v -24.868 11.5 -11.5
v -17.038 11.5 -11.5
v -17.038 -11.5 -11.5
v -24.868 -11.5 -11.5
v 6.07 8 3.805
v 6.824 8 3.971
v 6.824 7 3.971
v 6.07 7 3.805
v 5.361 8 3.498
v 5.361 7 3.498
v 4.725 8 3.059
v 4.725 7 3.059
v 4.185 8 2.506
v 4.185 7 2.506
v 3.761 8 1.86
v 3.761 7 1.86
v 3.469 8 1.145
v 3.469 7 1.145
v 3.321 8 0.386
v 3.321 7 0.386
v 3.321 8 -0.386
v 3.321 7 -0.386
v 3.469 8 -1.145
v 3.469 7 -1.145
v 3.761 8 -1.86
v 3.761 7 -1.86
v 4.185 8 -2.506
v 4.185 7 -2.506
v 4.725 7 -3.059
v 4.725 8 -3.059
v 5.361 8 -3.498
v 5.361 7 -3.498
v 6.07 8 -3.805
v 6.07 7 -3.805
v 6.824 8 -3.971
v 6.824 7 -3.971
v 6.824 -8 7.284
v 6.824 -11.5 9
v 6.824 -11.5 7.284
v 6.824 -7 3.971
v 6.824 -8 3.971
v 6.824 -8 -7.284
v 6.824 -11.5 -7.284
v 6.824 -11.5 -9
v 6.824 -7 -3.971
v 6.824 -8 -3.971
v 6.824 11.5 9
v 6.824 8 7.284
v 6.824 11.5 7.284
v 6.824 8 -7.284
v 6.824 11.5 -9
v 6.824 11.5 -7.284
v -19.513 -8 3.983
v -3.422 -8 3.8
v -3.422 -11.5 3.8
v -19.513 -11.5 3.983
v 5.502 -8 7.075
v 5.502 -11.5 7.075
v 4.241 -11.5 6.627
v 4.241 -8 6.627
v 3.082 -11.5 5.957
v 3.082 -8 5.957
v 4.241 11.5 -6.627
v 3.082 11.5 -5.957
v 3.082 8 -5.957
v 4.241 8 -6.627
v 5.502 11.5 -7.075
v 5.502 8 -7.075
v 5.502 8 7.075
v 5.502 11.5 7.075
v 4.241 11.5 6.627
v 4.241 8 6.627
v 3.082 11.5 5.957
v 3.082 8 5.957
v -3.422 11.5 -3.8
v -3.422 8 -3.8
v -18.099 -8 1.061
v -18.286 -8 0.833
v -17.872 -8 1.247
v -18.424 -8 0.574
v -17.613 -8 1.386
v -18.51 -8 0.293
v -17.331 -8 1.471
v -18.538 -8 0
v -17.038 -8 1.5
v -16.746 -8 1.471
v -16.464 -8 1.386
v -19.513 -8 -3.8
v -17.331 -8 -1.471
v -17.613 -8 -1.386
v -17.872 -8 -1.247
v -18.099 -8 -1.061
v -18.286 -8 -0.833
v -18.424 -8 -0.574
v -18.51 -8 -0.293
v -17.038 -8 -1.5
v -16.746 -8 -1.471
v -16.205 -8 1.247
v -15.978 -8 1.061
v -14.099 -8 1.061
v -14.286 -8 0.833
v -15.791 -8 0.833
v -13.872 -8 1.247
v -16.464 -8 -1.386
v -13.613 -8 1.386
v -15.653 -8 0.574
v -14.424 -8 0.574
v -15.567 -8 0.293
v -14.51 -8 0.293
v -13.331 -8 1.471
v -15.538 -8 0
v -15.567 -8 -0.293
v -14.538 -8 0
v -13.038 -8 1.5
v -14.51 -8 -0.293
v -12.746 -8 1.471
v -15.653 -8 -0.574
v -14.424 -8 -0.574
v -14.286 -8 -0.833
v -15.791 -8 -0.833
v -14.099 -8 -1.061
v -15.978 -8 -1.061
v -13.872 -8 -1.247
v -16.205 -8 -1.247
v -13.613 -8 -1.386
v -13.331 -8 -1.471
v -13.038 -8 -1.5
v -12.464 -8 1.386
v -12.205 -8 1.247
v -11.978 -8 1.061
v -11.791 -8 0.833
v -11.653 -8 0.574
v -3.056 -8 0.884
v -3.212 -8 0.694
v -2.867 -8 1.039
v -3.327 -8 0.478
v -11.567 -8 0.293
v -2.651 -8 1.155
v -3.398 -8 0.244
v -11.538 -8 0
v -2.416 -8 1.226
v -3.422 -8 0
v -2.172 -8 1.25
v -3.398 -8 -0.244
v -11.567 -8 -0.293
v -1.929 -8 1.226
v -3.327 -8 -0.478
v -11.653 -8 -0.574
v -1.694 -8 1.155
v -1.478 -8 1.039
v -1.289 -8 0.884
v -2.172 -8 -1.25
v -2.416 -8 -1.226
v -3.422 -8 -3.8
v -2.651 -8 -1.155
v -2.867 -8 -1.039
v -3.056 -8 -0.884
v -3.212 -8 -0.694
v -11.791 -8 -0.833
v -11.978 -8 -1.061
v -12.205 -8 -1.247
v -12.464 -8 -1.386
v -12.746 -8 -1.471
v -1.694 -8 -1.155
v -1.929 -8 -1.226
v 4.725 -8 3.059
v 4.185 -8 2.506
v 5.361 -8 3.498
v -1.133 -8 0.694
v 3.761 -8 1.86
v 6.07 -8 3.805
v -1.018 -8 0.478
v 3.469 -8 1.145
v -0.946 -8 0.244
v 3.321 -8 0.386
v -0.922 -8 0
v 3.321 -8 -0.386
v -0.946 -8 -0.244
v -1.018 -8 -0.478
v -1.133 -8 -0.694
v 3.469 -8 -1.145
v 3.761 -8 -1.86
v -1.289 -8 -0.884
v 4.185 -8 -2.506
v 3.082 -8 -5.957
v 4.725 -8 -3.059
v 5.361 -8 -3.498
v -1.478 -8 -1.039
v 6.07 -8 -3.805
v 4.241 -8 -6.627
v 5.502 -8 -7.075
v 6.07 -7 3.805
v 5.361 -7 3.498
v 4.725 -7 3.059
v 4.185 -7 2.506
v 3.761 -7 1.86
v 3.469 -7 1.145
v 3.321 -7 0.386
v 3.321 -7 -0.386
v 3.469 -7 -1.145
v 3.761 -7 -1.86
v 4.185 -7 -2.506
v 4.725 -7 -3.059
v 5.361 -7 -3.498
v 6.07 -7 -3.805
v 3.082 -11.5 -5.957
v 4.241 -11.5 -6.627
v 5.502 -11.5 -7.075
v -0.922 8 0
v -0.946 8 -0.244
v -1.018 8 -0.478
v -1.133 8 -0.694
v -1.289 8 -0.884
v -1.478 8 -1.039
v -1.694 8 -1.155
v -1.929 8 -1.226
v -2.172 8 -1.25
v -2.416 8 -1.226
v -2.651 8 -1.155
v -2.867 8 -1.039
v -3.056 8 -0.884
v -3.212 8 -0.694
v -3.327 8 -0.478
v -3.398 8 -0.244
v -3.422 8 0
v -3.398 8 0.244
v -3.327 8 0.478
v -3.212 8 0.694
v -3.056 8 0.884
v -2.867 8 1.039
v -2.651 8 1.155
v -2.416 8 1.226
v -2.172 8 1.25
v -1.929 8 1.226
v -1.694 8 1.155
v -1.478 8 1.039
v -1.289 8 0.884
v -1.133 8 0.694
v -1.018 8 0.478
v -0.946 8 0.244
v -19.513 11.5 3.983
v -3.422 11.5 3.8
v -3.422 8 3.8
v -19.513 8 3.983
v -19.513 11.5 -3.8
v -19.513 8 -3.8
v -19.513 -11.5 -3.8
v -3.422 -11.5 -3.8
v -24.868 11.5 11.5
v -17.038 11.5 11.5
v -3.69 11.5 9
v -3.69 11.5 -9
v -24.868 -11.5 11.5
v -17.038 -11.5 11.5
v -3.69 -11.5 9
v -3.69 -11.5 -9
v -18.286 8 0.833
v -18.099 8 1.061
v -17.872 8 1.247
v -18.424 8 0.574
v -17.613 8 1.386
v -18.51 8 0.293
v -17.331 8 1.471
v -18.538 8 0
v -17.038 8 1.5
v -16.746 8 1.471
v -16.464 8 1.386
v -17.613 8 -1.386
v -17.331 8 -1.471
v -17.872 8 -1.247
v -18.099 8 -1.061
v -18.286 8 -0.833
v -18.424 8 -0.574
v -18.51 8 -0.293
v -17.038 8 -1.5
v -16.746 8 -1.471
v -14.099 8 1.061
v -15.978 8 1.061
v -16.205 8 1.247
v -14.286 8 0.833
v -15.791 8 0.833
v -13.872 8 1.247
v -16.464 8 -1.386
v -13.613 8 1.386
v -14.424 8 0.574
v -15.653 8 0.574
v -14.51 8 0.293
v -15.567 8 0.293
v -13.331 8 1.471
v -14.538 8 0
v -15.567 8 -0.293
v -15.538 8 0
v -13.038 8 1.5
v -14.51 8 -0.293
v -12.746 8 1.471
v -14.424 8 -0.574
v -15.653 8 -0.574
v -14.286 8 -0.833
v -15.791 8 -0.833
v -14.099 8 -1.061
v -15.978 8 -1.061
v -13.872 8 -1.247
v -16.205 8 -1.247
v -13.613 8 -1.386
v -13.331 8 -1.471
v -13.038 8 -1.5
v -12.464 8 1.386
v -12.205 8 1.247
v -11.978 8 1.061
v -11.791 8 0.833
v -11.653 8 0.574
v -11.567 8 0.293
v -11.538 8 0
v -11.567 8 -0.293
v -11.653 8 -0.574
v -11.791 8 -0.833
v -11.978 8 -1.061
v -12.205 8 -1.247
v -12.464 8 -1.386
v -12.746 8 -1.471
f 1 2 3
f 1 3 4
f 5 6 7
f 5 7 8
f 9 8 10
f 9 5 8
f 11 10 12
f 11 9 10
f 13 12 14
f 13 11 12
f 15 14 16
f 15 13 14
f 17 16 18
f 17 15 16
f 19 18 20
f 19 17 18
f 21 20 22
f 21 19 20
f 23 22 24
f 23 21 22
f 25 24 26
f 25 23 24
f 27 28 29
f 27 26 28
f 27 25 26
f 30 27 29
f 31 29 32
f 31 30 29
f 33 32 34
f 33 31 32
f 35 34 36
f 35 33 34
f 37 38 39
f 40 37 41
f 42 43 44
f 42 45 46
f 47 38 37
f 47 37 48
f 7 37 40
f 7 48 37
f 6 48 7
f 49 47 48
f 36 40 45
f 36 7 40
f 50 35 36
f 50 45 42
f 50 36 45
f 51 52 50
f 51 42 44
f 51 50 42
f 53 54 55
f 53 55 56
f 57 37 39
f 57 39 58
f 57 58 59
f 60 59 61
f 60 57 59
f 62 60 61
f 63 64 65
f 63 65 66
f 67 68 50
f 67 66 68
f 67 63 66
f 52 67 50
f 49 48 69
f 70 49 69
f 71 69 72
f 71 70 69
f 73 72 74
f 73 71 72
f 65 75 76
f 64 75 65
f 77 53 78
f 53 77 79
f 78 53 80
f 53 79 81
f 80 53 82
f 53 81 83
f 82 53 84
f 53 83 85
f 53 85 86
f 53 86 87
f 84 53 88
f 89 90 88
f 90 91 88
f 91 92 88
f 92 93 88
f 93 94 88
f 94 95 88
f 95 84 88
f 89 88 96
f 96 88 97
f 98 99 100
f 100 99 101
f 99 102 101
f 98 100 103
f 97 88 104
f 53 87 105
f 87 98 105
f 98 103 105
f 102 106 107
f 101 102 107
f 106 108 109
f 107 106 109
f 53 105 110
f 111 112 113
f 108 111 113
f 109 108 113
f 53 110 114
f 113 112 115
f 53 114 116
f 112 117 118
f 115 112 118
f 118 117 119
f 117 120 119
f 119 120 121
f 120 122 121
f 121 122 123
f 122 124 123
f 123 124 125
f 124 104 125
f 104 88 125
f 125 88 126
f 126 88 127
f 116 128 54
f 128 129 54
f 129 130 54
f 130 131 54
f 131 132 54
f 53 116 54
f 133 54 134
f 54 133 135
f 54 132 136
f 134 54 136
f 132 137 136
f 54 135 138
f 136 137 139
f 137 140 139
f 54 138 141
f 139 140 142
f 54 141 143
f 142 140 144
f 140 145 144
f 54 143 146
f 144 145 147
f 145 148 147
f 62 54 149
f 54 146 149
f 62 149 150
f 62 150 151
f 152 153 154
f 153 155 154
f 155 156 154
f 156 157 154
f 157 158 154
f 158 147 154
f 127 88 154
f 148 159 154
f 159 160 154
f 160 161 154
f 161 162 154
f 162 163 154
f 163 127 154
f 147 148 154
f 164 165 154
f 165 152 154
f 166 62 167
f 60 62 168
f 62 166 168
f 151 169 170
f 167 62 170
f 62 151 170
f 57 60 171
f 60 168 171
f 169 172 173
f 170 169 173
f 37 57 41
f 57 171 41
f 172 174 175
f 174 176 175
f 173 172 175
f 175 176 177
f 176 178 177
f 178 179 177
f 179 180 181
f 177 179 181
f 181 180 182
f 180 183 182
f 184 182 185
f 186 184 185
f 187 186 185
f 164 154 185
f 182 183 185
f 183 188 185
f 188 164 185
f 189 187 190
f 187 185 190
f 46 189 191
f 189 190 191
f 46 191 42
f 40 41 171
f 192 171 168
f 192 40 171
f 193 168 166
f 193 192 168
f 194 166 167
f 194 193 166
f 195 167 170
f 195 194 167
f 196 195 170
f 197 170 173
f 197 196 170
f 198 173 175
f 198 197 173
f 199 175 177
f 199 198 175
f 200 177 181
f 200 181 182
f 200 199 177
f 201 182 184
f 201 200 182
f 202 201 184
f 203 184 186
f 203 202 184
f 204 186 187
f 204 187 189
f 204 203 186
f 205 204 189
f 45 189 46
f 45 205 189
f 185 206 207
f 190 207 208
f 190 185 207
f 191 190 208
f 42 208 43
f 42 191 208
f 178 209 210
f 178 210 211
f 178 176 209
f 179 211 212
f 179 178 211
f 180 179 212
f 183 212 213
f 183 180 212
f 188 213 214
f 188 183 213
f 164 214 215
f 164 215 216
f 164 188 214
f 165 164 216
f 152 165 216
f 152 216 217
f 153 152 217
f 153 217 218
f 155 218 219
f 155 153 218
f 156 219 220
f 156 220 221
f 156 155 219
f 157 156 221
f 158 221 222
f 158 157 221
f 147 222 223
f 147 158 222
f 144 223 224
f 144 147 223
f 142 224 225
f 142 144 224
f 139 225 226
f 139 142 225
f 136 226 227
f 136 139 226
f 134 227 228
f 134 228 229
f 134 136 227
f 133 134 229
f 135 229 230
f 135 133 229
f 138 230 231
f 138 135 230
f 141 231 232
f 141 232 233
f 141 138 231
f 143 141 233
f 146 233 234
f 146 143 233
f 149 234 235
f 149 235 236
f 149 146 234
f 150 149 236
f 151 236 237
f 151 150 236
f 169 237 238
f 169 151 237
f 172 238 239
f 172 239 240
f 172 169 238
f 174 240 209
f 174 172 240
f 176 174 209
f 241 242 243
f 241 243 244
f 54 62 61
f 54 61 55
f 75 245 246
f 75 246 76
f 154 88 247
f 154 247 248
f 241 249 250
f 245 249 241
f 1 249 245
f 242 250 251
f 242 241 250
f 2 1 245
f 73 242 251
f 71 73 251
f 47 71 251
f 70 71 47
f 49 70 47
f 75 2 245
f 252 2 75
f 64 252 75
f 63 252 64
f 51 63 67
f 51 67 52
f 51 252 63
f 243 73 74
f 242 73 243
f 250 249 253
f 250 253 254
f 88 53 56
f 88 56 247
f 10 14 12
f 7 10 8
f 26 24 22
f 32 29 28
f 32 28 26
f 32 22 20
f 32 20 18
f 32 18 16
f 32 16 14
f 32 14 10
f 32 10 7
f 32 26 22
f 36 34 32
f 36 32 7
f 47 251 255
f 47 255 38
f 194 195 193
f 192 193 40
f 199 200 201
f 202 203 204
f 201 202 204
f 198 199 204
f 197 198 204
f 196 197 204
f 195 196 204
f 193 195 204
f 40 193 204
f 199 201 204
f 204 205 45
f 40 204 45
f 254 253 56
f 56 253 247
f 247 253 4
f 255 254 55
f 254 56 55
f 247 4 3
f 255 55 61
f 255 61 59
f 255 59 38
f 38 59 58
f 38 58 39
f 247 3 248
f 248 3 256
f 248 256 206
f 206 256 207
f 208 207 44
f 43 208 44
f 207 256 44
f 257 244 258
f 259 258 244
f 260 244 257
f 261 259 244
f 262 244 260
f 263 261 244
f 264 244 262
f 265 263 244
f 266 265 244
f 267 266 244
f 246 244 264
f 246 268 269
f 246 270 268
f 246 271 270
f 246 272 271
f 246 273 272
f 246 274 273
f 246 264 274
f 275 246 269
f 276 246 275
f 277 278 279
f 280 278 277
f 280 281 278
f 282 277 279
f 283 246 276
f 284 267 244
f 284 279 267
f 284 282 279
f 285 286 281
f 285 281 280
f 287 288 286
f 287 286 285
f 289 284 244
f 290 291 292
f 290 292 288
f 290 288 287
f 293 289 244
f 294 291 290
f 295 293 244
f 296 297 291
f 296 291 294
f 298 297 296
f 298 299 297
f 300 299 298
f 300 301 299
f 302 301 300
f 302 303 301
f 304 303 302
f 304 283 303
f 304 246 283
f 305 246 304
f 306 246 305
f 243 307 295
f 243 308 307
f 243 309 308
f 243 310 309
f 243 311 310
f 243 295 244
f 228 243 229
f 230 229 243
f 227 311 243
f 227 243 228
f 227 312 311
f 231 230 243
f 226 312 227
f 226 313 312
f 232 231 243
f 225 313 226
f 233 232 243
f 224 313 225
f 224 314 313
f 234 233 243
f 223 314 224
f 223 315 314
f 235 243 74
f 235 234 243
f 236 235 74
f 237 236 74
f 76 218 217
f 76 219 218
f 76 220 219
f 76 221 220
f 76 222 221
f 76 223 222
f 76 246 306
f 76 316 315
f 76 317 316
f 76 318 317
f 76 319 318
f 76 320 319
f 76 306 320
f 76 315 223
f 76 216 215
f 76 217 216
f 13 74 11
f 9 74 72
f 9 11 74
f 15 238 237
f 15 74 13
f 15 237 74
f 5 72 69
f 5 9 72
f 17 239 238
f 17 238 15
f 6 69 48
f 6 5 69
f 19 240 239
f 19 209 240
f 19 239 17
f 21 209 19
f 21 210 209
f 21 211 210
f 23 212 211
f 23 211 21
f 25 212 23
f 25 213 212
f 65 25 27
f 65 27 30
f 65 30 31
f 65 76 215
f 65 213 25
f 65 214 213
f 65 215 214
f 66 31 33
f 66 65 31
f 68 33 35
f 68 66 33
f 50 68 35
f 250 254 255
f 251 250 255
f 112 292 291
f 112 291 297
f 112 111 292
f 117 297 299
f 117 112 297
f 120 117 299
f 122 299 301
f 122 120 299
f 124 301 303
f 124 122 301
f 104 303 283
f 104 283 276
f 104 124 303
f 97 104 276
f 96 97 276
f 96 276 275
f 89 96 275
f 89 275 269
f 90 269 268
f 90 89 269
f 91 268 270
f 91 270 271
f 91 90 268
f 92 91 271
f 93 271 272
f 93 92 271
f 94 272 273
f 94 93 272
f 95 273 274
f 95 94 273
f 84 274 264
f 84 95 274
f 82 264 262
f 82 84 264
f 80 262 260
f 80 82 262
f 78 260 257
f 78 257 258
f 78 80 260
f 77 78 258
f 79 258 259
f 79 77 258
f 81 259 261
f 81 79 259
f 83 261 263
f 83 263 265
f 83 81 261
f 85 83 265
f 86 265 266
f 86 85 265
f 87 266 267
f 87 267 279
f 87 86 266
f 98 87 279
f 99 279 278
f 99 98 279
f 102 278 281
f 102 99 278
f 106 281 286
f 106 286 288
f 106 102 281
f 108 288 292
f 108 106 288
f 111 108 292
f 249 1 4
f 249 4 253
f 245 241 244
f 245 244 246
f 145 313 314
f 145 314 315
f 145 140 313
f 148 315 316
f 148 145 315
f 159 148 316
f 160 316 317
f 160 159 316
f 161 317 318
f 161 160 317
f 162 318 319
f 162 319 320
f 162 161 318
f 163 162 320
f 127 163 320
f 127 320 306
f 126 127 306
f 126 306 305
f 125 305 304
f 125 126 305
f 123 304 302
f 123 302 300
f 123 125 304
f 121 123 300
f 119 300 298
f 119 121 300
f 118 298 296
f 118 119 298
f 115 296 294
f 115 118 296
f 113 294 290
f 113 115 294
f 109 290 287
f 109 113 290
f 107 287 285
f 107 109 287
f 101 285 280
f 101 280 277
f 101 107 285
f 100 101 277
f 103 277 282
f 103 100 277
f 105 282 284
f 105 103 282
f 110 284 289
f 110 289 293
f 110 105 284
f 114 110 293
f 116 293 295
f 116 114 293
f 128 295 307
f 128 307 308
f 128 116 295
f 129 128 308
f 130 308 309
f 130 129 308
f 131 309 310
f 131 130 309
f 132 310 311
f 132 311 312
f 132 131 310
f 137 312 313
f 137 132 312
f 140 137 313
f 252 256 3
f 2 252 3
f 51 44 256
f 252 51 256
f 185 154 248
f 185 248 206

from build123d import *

# Parameters (mm, degrees)
BOSS_EXTRUDE1_DEPTH = 11.5
SKETCH1_13_R        = 1.5
SKETCH1_13_R_2      = 1.25
BOSS_EXTRUDE2_DEPTH = 8
BOSS_EXTRUDE3_DEPTH = 7


with BuildPart() as part:
    # Sketch1 → Boss-Extrude1 (new, symmetric)
    with BuildSketch(Plane(origin=(0, 0, 0), x_dir=(1, 0, 0), z_dir=(0, 1, 0))):
        with BuildLine():
            Line((6.824314586, 7.284360201), (6.824314586, 9.00020274))
            Line((6.824314586, 9.00020274), (-3.690467309, 9.00020274))
            Line((-3.690467309, 9.00020274), (-17.038497557, 11.5))
            Line((-17.038497557, 11.5), (-24.867971487, 11.5))
            Line((-24.867971487, 11.5), (-24.867971487, -11.5))
            Line((-24.867971487, -11.5), (-17.038497557, -11.5))
            Line((-17.038497557, -11.5), (-3.690467309, -9.00020274))
            Line((-3.690467309, -9.00020274), (6.824314586, -9.00020274))
            Line((6.824314586, -9.00020274), (6.824314586, -7.284360201))
            ThreePointArc((6.824314586, -7.284360201), (4.861171432, -6.879883717), (3.082035449, -5.956732906))
            Line((3.082035449, -5.956732906), (-3.422402494, -3.8))
            Line((-3.422402494, -3.8), (-19.513448301, -3.98254267))
            Line((-19.513448301, -3.98254267), (-19.513448301, 3.8))
            Line((-19.513448301, 3.8), (-3.422402494, 3.8))
            Line((-3.422402494, 3.8), (3.082035449, 5.956732906))
            ThreePointArc((3.082035449, 5.956732906), (4.861171432, 6.879883717), (6.824314586, 7.284360201))
        make_face()
    extrude(amount=BOSS_EXTRUDE1_DEPTH, both=True)

    # Sketch1<13> → Boss-Extrude2 (add, symmetric)
    with BuildSketch(Plane(origin=(0, 0, 0), x_dir=(1, 0, 0), z_dir=(0, 1, 0))):
        with BuildLine():
            Line((6.824314586, 3.971385595), (6.824314586, 7.284360201))
            ThreePointArc((6.824314586, 7.284360201), (4.861171432, 6.879883717), (3.082035449, 5.956732906))
            Line((3.082035449, 5.956732906), (-3.422402494, 3.8))
            Line((-3.422402494, 3.8), (-19.513448301, 3.8))
            Line((-19.513448301, 3.8), (-19.513448301, -3.98254267))
            Line((-19.513448301, -3.98254267), (-3.422402494, -3.8))
            Line((-3.422402494, -3.8), (3.082035449, -5.956732906))
            ThreePointArc((3.082035449, -5.956732906), (4.861171432, -6.879883717), (6.824314586, -7.284360201))
            Line((6.824314586, -7.284360201), (6.824314586, -3.971385595))
            ThreePointArc((6.824314586, -3.971385595), (3.301909035, 0), (6.824314586, 3.971385595))
        make_face()
        with Locations((-17.038497557, 0)):
            Circle(SKETCH1_13_R, mode=Mode.SUBTRACT)
        with Locations((-13.038497557, 0)):
            Circle(SKETCH1_13_R, mode=Mode.SUBTRACT)
        with Locations((-2.172402494, 0)):
            Circle(SKETCH1_13_R_2, mode=Mode.SUBTRACT)
    extrude(amount=BOSS_EXTRUDE2_DEPTH, both=True)

    # Sketch1<14> → Boss-Extrude3 (add, symmetric)
    with BuildSketch(Plane(origin=(0, 0, 0), x_dir=(1, 0, 0), z_dir=(0, 1, 0))):
        with BuildLine():
            Line((6.824314586, -3.971385595), (6.824314586, 3.971385595))
            ThreePointArc((6.824314586, 3.971385595), (3.301909035, 0), (6.824314586, -3.971385595))
        make_face()
    extrude(amount=BOSS_EXTRUDE3_DEPTH, both=True)


solid = part.part
